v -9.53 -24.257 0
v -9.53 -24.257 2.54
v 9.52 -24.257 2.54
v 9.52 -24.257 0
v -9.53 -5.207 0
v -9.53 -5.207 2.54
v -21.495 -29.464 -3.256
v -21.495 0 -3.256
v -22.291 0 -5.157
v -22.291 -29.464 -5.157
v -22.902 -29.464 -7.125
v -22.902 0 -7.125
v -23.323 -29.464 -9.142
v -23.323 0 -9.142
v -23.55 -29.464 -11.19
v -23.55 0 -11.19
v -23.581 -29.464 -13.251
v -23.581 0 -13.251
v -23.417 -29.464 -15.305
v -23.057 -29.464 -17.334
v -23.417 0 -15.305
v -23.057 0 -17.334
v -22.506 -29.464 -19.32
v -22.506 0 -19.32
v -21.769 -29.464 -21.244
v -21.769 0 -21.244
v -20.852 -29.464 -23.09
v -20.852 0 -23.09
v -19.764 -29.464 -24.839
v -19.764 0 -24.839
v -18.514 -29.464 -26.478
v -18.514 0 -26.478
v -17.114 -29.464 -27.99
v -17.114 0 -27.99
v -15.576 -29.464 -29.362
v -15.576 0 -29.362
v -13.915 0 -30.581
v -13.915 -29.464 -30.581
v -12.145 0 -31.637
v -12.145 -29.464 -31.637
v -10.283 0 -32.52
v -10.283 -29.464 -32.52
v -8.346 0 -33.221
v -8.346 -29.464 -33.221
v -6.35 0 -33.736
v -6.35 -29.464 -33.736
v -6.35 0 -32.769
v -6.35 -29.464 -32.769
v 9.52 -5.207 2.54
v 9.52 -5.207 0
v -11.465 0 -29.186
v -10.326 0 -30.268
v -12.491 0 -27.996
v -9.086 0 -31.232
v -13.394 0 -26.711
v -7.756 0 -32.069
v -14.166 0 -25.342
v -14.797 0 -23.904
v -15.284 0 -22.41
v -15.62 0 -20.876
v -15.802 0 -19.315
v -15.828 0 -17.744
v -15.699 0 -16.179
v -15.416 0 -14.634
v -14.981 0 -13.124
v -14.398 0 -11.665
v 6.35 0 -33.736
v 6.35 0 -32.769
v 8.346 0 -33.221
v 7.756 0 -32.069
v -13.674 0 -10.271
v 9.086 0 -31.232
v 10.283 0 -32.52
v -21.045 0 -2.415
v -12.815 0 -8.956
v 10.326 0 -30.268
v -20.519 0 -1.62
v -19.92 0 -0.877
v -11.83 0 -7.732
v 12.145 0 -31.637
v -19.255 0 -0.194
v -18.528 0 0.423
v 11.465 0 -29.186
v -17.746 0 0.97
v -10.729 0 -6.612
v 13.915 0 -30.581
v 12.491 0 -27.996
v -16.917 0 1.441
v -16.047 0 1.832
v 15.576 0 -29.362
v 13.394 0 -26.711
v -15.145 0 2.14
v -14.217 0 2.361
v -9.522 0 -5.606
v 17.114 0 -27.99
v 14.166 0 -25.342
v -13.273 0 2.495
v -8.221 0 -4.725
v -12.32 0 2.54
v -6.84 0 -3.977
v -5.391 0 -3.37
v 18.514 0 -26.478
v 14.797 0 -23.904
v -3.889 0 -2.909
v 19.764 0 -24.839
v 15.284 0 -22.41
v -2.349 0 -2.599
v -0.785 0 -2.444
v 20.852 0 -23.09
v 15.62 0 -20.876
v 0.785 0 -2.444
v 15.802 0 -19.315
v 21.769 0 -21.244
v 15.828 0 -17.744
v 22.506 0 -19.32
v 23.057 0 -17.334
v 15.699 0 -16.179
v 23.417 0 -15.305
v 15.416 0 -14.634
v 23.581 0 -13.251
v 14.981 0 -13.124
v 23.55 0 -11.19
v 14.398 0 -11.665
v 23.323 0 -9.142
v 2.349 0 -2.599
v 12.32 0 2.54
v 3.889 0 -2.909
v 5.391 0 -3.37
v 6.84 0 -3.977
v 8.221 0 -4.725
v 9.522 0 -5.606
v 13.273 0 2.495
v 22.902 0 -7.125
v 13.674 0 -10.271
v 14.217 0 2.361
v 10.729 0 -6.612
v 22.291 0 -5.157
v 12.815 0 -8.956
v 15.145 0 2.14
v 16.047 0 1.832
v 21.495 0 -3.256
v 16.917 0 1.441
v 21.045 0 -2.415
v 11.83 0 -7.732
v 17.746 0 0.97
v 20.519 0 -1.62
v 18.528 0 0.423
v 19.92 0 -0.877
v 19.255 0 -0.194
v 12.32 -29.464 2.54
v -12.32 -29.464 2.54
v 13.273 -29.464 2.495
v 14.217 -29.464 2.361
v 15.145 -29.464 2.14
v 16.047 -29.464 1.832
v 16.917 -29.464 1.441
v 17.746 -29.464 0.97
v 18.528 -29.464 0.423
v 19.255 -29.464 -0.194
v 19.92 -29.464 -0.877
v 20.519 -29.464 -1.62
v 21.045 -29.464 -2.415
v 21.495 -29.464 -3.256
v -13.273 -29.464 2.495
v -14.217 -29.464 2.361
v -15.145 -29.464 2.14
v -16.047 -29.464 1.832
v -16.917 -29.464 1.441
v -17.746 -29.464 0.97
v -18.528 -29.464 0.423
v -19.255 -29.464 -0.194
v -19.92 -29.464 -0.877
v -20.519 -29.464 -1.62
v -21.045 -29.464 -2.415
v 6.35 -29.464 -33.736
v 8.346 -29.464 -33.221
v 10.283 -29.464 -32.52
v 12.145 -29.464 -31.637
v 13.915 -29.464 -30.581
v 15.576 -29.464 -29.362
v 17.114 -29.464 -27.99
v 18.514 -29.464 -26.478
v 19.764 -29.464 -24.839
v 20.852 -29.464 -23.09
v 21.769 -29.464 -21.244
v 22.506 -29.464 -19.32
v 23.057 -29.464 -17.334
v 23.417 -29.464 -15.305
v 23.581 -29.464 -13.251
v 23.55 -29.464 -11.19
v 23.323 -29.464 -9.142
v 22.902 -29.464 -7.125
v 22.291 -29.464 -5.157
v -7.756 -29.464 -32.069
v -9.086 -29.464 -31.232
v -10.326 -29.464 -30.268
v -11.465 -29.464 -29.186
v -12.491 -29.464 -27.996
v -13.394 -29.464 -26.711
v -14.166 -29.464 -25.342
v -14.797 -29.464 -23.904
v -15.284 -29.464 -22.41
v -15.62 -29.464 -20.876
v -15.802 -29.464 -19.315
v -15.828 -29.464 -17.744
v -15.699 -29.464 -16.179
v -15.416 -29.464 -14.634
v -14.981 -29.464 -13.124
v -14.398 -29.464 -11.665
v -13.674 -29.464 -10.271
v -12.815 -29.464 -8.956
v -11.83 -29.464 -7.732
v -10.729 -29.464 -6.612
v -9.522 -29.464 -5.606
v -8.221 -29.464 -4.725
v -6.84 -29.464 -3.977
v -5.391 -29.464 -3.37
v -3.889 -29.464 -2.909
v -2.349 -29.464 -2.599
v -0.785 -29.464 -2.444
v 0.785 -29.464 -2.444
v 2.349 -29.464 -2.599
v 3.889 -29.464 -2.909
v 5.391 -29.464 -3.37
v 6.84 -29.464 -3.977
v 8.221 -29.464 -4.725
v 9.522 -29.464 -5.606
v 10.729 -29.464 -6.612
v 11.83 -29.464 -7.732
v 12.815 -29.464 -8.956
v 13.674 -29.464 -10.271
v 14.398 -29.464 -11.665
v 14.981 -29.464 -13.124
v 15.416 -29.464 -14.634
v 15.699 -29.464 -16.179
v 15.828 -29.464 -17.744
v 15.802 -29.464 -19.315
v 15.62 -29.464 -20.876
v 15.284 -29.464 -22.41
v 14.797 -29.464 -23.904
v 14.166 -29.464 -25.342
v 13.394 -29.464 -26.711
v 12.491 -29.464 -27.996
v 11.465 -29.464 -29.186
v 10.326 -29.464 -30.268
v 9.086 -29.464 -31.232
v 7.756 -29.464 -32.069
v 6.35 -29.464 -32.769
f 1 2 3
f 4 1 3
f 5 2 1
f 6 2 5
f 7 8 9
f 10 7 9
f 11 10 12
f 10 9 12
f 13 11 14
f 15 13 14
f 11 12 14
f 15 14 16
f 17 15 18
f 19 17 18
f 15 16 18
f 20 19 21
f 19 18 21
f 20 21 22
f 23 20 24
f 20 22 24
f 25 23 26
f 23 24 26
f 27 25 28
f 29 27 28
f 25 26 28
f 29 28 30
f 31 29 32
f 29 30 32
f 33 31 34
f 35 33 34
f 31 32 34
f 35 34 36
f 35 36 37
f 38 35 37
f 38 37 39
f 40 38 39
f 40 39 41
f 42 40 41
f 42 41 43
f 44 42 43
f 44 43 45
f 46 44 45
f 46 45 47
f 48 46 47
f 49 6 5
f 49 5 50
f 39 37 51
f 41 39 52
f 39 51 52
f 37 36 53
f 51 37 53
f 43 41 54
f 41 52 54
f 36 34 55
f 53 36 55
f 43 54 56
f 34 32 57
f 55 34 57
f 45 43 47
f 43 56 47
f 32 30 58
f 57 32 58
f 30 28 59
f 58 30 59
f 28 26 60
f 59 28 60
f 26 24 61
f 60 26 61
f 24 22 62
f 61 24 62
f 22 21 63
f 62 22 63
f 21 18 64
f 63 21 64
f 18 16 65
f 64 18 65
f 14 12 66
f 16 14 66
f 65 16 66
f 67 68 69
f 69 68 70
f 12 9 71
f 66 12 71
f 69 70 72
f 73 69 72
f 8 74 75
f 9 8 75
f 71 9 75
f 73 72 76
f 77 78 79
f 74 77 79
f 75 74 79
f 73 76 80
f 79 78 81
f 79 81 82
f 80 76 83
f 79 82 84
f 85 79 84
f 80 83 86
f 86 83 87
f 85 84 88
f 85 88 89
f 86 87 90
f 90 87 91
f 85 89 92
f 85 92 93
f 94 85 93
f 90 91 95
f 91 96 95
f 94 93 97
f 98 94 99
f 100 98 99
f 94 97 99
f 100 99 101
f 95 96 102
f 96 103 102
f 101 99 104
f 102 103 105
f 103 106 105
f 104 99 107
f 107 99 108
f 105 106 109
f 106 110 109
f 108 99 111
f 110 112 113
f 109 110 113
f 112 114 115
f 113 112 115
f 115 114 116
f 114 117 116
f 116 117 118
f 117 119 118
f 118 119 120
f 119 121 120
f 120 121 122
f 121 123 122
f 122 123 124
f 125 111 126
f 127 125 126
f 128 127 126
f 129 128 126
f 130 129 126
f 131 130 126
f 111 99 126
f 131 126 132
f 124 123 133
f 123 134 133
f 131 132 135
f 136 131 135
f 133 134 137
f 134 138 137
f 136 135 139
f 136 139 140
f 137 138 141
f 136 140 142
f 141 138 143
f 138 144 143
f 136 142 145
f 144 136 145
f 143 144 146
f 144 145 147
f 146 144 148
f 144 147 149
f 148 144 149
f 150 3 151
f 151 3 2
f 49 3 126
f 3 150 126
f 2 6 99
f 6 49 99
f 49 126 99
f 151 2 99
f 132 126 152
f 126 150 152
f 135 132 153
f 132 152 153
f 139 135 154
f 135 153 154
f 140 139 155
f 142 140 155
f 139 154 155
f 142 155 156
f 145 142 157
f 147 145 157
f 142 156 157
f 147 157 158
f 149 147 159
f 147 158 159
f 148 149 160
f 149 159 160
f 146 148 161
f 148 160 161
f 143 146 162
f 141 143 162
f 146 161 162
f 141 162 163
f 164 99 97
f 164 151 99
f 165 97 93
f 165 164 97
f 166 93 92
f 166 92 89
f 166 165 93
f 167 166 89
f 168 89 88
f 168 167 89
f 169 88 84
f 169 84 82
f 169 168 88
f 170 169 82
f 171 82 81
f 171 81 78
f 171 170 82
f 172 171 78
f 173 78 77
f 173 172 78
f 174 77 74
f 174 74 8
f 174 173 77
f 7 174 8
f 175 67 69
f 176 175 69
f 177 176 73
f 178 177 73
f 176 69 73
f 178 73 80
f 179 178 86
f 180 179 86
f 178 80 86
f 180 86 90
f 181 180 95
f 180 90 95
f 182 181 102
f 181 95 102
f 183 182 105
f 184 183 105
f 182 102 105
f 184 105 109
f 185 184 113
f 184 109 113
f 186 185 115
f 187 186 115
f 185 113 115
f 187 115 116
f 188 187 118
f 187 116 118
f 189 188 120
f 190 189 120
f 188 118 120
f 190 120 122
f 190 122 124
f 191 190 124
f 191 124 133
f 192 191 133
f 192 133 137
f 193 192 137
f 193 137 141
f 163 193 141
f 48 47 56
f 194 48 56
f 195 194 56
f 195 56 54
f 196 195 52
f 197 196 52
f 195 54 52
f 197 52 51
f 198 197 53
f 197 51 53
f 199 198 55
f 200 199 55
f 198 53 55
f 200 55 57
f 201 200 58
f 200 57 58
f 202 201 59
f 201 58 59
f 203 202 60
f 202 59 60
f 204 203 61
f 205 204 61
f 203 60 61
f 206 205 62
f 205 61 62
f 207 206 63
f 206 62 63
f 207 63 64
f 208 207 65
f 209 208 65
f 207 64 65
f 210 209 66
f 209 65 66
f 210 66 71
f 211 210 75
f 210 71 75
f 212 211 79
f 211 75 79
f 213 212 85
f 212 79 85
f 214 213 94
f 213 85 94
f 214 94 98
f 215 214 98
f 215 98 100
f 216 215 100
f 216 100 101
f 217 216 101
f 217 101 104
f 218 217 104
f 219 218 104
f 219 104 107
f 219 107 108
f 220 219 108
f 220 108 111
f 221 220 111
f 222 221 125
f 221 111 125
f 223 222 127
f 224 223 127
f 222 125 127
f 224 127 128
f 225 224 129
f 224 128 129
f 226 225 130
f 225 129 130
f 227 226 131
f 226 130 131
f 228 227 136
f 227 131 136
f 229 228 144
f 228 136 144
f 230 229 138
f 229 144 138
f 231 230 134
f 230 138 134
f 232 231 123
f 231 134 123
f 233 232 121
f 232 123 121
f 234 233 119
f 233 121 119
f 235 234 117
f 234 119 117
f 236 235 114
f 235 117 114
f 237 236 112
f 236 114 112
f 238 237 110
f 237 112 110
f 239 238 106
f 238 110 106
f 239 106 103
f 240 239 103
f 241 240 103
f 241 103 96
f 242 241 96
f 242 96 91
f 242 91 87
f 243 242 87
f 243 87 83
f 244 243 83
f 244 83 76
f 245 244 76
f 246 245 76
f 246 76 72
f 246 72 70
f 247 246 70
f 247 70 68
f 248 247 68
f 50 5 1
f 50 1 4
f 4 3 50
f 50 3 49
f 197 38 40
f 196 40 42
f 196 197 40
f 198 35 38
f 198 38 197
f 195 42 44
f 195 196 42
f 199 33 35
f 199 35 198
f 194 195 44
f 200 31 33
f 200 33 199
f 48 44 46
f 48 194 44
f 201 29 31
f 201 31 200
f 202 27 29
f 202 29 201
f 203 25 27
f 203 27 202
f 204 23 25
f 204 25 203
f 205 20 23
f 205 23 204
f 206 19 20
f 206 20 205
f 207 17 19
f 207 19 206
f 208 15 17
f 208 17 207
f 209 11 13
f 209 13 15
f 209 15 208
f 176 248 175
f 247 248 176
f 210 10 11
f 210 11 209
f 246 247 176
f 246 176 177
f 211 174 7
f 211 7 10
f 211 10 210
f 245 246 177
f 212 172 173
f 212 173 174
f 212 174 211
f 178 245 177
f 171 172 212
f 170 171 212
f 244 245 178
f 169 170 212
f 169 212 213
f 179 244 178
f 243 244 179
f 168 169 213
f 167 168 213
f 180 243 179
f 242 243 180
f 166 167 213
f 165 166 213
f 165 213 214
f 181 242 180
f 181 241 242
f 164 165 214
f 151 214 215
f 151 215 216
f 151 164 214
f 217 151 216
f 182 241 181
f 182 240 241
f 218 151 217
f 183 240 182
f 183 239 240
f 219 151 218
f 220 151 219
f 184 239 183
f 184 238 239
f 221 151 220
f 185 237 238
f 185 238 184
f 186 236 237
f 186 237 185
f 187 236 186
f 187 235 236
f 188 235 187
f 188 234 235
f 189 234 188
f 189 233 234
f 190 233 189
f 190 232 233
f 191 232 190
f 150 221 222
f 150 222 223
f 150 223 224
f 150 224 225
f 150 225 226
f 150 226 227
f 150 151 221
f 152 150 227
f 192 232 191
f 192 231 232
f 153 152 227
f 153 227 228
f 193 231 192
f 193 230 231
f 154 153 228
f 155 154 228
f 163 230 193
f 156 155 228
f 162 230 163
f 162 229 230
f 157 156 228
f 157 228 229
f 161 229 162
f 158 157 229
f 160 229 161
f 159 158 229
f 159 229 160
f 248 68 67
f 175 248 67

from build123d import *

# Parameters (mm, degrees)
F1_DEPTH = 29.464
F2_R     = 10.16
F3_W     = 19.05
F3_H     = 19.05
F4_DEPTH = 2.54


with BuildPart() as f1:
    # F0 (on Front) → F1 (new body)
    with BuildSketch(Plane.XZ):
        with BuildLine():
            Line((17.4625, 2.54), (-17.4625, 2.54))
            ThreePointArc((-17.4625, 2.54), (-22.643836, -18.887087), (-6.35, -33.735563))
            Line((-6.35, -33.735563), (-6.35, -32.769032))
            ThreePointArc((-6.35, -32.769032), (0, -2.424034), (6.35, -32.769032))
            Line((6.35, -32.769032), (6.35, -33.735565))
            ThreePointArc((6.35, -33.735565), (22.643841, -18.88709), (17.4625, 2.54))
        make_face()
    extrude(amount=F1_DEPTH)

    # F2
    f2_edges = [f1.edges().sort_by_distance(p)[0] for p in [
        (-17.4625, -14.732, 2.54),
        (17.4625, -14.732, 2.54),
    ]]
    fillet(f2_edges, radius=F2_R)

    # F3 (on face) → F4 (cut)
    with BuildSketch(Plane.XY.offset(2.54)):
        with Locations((-0.005137, -14.732)):
            Rectangle(F3_W, F3_H)
    extrude(amount=-F4_DEPTH, mode=Mode.SUBTRACT)


solid = f1.part
